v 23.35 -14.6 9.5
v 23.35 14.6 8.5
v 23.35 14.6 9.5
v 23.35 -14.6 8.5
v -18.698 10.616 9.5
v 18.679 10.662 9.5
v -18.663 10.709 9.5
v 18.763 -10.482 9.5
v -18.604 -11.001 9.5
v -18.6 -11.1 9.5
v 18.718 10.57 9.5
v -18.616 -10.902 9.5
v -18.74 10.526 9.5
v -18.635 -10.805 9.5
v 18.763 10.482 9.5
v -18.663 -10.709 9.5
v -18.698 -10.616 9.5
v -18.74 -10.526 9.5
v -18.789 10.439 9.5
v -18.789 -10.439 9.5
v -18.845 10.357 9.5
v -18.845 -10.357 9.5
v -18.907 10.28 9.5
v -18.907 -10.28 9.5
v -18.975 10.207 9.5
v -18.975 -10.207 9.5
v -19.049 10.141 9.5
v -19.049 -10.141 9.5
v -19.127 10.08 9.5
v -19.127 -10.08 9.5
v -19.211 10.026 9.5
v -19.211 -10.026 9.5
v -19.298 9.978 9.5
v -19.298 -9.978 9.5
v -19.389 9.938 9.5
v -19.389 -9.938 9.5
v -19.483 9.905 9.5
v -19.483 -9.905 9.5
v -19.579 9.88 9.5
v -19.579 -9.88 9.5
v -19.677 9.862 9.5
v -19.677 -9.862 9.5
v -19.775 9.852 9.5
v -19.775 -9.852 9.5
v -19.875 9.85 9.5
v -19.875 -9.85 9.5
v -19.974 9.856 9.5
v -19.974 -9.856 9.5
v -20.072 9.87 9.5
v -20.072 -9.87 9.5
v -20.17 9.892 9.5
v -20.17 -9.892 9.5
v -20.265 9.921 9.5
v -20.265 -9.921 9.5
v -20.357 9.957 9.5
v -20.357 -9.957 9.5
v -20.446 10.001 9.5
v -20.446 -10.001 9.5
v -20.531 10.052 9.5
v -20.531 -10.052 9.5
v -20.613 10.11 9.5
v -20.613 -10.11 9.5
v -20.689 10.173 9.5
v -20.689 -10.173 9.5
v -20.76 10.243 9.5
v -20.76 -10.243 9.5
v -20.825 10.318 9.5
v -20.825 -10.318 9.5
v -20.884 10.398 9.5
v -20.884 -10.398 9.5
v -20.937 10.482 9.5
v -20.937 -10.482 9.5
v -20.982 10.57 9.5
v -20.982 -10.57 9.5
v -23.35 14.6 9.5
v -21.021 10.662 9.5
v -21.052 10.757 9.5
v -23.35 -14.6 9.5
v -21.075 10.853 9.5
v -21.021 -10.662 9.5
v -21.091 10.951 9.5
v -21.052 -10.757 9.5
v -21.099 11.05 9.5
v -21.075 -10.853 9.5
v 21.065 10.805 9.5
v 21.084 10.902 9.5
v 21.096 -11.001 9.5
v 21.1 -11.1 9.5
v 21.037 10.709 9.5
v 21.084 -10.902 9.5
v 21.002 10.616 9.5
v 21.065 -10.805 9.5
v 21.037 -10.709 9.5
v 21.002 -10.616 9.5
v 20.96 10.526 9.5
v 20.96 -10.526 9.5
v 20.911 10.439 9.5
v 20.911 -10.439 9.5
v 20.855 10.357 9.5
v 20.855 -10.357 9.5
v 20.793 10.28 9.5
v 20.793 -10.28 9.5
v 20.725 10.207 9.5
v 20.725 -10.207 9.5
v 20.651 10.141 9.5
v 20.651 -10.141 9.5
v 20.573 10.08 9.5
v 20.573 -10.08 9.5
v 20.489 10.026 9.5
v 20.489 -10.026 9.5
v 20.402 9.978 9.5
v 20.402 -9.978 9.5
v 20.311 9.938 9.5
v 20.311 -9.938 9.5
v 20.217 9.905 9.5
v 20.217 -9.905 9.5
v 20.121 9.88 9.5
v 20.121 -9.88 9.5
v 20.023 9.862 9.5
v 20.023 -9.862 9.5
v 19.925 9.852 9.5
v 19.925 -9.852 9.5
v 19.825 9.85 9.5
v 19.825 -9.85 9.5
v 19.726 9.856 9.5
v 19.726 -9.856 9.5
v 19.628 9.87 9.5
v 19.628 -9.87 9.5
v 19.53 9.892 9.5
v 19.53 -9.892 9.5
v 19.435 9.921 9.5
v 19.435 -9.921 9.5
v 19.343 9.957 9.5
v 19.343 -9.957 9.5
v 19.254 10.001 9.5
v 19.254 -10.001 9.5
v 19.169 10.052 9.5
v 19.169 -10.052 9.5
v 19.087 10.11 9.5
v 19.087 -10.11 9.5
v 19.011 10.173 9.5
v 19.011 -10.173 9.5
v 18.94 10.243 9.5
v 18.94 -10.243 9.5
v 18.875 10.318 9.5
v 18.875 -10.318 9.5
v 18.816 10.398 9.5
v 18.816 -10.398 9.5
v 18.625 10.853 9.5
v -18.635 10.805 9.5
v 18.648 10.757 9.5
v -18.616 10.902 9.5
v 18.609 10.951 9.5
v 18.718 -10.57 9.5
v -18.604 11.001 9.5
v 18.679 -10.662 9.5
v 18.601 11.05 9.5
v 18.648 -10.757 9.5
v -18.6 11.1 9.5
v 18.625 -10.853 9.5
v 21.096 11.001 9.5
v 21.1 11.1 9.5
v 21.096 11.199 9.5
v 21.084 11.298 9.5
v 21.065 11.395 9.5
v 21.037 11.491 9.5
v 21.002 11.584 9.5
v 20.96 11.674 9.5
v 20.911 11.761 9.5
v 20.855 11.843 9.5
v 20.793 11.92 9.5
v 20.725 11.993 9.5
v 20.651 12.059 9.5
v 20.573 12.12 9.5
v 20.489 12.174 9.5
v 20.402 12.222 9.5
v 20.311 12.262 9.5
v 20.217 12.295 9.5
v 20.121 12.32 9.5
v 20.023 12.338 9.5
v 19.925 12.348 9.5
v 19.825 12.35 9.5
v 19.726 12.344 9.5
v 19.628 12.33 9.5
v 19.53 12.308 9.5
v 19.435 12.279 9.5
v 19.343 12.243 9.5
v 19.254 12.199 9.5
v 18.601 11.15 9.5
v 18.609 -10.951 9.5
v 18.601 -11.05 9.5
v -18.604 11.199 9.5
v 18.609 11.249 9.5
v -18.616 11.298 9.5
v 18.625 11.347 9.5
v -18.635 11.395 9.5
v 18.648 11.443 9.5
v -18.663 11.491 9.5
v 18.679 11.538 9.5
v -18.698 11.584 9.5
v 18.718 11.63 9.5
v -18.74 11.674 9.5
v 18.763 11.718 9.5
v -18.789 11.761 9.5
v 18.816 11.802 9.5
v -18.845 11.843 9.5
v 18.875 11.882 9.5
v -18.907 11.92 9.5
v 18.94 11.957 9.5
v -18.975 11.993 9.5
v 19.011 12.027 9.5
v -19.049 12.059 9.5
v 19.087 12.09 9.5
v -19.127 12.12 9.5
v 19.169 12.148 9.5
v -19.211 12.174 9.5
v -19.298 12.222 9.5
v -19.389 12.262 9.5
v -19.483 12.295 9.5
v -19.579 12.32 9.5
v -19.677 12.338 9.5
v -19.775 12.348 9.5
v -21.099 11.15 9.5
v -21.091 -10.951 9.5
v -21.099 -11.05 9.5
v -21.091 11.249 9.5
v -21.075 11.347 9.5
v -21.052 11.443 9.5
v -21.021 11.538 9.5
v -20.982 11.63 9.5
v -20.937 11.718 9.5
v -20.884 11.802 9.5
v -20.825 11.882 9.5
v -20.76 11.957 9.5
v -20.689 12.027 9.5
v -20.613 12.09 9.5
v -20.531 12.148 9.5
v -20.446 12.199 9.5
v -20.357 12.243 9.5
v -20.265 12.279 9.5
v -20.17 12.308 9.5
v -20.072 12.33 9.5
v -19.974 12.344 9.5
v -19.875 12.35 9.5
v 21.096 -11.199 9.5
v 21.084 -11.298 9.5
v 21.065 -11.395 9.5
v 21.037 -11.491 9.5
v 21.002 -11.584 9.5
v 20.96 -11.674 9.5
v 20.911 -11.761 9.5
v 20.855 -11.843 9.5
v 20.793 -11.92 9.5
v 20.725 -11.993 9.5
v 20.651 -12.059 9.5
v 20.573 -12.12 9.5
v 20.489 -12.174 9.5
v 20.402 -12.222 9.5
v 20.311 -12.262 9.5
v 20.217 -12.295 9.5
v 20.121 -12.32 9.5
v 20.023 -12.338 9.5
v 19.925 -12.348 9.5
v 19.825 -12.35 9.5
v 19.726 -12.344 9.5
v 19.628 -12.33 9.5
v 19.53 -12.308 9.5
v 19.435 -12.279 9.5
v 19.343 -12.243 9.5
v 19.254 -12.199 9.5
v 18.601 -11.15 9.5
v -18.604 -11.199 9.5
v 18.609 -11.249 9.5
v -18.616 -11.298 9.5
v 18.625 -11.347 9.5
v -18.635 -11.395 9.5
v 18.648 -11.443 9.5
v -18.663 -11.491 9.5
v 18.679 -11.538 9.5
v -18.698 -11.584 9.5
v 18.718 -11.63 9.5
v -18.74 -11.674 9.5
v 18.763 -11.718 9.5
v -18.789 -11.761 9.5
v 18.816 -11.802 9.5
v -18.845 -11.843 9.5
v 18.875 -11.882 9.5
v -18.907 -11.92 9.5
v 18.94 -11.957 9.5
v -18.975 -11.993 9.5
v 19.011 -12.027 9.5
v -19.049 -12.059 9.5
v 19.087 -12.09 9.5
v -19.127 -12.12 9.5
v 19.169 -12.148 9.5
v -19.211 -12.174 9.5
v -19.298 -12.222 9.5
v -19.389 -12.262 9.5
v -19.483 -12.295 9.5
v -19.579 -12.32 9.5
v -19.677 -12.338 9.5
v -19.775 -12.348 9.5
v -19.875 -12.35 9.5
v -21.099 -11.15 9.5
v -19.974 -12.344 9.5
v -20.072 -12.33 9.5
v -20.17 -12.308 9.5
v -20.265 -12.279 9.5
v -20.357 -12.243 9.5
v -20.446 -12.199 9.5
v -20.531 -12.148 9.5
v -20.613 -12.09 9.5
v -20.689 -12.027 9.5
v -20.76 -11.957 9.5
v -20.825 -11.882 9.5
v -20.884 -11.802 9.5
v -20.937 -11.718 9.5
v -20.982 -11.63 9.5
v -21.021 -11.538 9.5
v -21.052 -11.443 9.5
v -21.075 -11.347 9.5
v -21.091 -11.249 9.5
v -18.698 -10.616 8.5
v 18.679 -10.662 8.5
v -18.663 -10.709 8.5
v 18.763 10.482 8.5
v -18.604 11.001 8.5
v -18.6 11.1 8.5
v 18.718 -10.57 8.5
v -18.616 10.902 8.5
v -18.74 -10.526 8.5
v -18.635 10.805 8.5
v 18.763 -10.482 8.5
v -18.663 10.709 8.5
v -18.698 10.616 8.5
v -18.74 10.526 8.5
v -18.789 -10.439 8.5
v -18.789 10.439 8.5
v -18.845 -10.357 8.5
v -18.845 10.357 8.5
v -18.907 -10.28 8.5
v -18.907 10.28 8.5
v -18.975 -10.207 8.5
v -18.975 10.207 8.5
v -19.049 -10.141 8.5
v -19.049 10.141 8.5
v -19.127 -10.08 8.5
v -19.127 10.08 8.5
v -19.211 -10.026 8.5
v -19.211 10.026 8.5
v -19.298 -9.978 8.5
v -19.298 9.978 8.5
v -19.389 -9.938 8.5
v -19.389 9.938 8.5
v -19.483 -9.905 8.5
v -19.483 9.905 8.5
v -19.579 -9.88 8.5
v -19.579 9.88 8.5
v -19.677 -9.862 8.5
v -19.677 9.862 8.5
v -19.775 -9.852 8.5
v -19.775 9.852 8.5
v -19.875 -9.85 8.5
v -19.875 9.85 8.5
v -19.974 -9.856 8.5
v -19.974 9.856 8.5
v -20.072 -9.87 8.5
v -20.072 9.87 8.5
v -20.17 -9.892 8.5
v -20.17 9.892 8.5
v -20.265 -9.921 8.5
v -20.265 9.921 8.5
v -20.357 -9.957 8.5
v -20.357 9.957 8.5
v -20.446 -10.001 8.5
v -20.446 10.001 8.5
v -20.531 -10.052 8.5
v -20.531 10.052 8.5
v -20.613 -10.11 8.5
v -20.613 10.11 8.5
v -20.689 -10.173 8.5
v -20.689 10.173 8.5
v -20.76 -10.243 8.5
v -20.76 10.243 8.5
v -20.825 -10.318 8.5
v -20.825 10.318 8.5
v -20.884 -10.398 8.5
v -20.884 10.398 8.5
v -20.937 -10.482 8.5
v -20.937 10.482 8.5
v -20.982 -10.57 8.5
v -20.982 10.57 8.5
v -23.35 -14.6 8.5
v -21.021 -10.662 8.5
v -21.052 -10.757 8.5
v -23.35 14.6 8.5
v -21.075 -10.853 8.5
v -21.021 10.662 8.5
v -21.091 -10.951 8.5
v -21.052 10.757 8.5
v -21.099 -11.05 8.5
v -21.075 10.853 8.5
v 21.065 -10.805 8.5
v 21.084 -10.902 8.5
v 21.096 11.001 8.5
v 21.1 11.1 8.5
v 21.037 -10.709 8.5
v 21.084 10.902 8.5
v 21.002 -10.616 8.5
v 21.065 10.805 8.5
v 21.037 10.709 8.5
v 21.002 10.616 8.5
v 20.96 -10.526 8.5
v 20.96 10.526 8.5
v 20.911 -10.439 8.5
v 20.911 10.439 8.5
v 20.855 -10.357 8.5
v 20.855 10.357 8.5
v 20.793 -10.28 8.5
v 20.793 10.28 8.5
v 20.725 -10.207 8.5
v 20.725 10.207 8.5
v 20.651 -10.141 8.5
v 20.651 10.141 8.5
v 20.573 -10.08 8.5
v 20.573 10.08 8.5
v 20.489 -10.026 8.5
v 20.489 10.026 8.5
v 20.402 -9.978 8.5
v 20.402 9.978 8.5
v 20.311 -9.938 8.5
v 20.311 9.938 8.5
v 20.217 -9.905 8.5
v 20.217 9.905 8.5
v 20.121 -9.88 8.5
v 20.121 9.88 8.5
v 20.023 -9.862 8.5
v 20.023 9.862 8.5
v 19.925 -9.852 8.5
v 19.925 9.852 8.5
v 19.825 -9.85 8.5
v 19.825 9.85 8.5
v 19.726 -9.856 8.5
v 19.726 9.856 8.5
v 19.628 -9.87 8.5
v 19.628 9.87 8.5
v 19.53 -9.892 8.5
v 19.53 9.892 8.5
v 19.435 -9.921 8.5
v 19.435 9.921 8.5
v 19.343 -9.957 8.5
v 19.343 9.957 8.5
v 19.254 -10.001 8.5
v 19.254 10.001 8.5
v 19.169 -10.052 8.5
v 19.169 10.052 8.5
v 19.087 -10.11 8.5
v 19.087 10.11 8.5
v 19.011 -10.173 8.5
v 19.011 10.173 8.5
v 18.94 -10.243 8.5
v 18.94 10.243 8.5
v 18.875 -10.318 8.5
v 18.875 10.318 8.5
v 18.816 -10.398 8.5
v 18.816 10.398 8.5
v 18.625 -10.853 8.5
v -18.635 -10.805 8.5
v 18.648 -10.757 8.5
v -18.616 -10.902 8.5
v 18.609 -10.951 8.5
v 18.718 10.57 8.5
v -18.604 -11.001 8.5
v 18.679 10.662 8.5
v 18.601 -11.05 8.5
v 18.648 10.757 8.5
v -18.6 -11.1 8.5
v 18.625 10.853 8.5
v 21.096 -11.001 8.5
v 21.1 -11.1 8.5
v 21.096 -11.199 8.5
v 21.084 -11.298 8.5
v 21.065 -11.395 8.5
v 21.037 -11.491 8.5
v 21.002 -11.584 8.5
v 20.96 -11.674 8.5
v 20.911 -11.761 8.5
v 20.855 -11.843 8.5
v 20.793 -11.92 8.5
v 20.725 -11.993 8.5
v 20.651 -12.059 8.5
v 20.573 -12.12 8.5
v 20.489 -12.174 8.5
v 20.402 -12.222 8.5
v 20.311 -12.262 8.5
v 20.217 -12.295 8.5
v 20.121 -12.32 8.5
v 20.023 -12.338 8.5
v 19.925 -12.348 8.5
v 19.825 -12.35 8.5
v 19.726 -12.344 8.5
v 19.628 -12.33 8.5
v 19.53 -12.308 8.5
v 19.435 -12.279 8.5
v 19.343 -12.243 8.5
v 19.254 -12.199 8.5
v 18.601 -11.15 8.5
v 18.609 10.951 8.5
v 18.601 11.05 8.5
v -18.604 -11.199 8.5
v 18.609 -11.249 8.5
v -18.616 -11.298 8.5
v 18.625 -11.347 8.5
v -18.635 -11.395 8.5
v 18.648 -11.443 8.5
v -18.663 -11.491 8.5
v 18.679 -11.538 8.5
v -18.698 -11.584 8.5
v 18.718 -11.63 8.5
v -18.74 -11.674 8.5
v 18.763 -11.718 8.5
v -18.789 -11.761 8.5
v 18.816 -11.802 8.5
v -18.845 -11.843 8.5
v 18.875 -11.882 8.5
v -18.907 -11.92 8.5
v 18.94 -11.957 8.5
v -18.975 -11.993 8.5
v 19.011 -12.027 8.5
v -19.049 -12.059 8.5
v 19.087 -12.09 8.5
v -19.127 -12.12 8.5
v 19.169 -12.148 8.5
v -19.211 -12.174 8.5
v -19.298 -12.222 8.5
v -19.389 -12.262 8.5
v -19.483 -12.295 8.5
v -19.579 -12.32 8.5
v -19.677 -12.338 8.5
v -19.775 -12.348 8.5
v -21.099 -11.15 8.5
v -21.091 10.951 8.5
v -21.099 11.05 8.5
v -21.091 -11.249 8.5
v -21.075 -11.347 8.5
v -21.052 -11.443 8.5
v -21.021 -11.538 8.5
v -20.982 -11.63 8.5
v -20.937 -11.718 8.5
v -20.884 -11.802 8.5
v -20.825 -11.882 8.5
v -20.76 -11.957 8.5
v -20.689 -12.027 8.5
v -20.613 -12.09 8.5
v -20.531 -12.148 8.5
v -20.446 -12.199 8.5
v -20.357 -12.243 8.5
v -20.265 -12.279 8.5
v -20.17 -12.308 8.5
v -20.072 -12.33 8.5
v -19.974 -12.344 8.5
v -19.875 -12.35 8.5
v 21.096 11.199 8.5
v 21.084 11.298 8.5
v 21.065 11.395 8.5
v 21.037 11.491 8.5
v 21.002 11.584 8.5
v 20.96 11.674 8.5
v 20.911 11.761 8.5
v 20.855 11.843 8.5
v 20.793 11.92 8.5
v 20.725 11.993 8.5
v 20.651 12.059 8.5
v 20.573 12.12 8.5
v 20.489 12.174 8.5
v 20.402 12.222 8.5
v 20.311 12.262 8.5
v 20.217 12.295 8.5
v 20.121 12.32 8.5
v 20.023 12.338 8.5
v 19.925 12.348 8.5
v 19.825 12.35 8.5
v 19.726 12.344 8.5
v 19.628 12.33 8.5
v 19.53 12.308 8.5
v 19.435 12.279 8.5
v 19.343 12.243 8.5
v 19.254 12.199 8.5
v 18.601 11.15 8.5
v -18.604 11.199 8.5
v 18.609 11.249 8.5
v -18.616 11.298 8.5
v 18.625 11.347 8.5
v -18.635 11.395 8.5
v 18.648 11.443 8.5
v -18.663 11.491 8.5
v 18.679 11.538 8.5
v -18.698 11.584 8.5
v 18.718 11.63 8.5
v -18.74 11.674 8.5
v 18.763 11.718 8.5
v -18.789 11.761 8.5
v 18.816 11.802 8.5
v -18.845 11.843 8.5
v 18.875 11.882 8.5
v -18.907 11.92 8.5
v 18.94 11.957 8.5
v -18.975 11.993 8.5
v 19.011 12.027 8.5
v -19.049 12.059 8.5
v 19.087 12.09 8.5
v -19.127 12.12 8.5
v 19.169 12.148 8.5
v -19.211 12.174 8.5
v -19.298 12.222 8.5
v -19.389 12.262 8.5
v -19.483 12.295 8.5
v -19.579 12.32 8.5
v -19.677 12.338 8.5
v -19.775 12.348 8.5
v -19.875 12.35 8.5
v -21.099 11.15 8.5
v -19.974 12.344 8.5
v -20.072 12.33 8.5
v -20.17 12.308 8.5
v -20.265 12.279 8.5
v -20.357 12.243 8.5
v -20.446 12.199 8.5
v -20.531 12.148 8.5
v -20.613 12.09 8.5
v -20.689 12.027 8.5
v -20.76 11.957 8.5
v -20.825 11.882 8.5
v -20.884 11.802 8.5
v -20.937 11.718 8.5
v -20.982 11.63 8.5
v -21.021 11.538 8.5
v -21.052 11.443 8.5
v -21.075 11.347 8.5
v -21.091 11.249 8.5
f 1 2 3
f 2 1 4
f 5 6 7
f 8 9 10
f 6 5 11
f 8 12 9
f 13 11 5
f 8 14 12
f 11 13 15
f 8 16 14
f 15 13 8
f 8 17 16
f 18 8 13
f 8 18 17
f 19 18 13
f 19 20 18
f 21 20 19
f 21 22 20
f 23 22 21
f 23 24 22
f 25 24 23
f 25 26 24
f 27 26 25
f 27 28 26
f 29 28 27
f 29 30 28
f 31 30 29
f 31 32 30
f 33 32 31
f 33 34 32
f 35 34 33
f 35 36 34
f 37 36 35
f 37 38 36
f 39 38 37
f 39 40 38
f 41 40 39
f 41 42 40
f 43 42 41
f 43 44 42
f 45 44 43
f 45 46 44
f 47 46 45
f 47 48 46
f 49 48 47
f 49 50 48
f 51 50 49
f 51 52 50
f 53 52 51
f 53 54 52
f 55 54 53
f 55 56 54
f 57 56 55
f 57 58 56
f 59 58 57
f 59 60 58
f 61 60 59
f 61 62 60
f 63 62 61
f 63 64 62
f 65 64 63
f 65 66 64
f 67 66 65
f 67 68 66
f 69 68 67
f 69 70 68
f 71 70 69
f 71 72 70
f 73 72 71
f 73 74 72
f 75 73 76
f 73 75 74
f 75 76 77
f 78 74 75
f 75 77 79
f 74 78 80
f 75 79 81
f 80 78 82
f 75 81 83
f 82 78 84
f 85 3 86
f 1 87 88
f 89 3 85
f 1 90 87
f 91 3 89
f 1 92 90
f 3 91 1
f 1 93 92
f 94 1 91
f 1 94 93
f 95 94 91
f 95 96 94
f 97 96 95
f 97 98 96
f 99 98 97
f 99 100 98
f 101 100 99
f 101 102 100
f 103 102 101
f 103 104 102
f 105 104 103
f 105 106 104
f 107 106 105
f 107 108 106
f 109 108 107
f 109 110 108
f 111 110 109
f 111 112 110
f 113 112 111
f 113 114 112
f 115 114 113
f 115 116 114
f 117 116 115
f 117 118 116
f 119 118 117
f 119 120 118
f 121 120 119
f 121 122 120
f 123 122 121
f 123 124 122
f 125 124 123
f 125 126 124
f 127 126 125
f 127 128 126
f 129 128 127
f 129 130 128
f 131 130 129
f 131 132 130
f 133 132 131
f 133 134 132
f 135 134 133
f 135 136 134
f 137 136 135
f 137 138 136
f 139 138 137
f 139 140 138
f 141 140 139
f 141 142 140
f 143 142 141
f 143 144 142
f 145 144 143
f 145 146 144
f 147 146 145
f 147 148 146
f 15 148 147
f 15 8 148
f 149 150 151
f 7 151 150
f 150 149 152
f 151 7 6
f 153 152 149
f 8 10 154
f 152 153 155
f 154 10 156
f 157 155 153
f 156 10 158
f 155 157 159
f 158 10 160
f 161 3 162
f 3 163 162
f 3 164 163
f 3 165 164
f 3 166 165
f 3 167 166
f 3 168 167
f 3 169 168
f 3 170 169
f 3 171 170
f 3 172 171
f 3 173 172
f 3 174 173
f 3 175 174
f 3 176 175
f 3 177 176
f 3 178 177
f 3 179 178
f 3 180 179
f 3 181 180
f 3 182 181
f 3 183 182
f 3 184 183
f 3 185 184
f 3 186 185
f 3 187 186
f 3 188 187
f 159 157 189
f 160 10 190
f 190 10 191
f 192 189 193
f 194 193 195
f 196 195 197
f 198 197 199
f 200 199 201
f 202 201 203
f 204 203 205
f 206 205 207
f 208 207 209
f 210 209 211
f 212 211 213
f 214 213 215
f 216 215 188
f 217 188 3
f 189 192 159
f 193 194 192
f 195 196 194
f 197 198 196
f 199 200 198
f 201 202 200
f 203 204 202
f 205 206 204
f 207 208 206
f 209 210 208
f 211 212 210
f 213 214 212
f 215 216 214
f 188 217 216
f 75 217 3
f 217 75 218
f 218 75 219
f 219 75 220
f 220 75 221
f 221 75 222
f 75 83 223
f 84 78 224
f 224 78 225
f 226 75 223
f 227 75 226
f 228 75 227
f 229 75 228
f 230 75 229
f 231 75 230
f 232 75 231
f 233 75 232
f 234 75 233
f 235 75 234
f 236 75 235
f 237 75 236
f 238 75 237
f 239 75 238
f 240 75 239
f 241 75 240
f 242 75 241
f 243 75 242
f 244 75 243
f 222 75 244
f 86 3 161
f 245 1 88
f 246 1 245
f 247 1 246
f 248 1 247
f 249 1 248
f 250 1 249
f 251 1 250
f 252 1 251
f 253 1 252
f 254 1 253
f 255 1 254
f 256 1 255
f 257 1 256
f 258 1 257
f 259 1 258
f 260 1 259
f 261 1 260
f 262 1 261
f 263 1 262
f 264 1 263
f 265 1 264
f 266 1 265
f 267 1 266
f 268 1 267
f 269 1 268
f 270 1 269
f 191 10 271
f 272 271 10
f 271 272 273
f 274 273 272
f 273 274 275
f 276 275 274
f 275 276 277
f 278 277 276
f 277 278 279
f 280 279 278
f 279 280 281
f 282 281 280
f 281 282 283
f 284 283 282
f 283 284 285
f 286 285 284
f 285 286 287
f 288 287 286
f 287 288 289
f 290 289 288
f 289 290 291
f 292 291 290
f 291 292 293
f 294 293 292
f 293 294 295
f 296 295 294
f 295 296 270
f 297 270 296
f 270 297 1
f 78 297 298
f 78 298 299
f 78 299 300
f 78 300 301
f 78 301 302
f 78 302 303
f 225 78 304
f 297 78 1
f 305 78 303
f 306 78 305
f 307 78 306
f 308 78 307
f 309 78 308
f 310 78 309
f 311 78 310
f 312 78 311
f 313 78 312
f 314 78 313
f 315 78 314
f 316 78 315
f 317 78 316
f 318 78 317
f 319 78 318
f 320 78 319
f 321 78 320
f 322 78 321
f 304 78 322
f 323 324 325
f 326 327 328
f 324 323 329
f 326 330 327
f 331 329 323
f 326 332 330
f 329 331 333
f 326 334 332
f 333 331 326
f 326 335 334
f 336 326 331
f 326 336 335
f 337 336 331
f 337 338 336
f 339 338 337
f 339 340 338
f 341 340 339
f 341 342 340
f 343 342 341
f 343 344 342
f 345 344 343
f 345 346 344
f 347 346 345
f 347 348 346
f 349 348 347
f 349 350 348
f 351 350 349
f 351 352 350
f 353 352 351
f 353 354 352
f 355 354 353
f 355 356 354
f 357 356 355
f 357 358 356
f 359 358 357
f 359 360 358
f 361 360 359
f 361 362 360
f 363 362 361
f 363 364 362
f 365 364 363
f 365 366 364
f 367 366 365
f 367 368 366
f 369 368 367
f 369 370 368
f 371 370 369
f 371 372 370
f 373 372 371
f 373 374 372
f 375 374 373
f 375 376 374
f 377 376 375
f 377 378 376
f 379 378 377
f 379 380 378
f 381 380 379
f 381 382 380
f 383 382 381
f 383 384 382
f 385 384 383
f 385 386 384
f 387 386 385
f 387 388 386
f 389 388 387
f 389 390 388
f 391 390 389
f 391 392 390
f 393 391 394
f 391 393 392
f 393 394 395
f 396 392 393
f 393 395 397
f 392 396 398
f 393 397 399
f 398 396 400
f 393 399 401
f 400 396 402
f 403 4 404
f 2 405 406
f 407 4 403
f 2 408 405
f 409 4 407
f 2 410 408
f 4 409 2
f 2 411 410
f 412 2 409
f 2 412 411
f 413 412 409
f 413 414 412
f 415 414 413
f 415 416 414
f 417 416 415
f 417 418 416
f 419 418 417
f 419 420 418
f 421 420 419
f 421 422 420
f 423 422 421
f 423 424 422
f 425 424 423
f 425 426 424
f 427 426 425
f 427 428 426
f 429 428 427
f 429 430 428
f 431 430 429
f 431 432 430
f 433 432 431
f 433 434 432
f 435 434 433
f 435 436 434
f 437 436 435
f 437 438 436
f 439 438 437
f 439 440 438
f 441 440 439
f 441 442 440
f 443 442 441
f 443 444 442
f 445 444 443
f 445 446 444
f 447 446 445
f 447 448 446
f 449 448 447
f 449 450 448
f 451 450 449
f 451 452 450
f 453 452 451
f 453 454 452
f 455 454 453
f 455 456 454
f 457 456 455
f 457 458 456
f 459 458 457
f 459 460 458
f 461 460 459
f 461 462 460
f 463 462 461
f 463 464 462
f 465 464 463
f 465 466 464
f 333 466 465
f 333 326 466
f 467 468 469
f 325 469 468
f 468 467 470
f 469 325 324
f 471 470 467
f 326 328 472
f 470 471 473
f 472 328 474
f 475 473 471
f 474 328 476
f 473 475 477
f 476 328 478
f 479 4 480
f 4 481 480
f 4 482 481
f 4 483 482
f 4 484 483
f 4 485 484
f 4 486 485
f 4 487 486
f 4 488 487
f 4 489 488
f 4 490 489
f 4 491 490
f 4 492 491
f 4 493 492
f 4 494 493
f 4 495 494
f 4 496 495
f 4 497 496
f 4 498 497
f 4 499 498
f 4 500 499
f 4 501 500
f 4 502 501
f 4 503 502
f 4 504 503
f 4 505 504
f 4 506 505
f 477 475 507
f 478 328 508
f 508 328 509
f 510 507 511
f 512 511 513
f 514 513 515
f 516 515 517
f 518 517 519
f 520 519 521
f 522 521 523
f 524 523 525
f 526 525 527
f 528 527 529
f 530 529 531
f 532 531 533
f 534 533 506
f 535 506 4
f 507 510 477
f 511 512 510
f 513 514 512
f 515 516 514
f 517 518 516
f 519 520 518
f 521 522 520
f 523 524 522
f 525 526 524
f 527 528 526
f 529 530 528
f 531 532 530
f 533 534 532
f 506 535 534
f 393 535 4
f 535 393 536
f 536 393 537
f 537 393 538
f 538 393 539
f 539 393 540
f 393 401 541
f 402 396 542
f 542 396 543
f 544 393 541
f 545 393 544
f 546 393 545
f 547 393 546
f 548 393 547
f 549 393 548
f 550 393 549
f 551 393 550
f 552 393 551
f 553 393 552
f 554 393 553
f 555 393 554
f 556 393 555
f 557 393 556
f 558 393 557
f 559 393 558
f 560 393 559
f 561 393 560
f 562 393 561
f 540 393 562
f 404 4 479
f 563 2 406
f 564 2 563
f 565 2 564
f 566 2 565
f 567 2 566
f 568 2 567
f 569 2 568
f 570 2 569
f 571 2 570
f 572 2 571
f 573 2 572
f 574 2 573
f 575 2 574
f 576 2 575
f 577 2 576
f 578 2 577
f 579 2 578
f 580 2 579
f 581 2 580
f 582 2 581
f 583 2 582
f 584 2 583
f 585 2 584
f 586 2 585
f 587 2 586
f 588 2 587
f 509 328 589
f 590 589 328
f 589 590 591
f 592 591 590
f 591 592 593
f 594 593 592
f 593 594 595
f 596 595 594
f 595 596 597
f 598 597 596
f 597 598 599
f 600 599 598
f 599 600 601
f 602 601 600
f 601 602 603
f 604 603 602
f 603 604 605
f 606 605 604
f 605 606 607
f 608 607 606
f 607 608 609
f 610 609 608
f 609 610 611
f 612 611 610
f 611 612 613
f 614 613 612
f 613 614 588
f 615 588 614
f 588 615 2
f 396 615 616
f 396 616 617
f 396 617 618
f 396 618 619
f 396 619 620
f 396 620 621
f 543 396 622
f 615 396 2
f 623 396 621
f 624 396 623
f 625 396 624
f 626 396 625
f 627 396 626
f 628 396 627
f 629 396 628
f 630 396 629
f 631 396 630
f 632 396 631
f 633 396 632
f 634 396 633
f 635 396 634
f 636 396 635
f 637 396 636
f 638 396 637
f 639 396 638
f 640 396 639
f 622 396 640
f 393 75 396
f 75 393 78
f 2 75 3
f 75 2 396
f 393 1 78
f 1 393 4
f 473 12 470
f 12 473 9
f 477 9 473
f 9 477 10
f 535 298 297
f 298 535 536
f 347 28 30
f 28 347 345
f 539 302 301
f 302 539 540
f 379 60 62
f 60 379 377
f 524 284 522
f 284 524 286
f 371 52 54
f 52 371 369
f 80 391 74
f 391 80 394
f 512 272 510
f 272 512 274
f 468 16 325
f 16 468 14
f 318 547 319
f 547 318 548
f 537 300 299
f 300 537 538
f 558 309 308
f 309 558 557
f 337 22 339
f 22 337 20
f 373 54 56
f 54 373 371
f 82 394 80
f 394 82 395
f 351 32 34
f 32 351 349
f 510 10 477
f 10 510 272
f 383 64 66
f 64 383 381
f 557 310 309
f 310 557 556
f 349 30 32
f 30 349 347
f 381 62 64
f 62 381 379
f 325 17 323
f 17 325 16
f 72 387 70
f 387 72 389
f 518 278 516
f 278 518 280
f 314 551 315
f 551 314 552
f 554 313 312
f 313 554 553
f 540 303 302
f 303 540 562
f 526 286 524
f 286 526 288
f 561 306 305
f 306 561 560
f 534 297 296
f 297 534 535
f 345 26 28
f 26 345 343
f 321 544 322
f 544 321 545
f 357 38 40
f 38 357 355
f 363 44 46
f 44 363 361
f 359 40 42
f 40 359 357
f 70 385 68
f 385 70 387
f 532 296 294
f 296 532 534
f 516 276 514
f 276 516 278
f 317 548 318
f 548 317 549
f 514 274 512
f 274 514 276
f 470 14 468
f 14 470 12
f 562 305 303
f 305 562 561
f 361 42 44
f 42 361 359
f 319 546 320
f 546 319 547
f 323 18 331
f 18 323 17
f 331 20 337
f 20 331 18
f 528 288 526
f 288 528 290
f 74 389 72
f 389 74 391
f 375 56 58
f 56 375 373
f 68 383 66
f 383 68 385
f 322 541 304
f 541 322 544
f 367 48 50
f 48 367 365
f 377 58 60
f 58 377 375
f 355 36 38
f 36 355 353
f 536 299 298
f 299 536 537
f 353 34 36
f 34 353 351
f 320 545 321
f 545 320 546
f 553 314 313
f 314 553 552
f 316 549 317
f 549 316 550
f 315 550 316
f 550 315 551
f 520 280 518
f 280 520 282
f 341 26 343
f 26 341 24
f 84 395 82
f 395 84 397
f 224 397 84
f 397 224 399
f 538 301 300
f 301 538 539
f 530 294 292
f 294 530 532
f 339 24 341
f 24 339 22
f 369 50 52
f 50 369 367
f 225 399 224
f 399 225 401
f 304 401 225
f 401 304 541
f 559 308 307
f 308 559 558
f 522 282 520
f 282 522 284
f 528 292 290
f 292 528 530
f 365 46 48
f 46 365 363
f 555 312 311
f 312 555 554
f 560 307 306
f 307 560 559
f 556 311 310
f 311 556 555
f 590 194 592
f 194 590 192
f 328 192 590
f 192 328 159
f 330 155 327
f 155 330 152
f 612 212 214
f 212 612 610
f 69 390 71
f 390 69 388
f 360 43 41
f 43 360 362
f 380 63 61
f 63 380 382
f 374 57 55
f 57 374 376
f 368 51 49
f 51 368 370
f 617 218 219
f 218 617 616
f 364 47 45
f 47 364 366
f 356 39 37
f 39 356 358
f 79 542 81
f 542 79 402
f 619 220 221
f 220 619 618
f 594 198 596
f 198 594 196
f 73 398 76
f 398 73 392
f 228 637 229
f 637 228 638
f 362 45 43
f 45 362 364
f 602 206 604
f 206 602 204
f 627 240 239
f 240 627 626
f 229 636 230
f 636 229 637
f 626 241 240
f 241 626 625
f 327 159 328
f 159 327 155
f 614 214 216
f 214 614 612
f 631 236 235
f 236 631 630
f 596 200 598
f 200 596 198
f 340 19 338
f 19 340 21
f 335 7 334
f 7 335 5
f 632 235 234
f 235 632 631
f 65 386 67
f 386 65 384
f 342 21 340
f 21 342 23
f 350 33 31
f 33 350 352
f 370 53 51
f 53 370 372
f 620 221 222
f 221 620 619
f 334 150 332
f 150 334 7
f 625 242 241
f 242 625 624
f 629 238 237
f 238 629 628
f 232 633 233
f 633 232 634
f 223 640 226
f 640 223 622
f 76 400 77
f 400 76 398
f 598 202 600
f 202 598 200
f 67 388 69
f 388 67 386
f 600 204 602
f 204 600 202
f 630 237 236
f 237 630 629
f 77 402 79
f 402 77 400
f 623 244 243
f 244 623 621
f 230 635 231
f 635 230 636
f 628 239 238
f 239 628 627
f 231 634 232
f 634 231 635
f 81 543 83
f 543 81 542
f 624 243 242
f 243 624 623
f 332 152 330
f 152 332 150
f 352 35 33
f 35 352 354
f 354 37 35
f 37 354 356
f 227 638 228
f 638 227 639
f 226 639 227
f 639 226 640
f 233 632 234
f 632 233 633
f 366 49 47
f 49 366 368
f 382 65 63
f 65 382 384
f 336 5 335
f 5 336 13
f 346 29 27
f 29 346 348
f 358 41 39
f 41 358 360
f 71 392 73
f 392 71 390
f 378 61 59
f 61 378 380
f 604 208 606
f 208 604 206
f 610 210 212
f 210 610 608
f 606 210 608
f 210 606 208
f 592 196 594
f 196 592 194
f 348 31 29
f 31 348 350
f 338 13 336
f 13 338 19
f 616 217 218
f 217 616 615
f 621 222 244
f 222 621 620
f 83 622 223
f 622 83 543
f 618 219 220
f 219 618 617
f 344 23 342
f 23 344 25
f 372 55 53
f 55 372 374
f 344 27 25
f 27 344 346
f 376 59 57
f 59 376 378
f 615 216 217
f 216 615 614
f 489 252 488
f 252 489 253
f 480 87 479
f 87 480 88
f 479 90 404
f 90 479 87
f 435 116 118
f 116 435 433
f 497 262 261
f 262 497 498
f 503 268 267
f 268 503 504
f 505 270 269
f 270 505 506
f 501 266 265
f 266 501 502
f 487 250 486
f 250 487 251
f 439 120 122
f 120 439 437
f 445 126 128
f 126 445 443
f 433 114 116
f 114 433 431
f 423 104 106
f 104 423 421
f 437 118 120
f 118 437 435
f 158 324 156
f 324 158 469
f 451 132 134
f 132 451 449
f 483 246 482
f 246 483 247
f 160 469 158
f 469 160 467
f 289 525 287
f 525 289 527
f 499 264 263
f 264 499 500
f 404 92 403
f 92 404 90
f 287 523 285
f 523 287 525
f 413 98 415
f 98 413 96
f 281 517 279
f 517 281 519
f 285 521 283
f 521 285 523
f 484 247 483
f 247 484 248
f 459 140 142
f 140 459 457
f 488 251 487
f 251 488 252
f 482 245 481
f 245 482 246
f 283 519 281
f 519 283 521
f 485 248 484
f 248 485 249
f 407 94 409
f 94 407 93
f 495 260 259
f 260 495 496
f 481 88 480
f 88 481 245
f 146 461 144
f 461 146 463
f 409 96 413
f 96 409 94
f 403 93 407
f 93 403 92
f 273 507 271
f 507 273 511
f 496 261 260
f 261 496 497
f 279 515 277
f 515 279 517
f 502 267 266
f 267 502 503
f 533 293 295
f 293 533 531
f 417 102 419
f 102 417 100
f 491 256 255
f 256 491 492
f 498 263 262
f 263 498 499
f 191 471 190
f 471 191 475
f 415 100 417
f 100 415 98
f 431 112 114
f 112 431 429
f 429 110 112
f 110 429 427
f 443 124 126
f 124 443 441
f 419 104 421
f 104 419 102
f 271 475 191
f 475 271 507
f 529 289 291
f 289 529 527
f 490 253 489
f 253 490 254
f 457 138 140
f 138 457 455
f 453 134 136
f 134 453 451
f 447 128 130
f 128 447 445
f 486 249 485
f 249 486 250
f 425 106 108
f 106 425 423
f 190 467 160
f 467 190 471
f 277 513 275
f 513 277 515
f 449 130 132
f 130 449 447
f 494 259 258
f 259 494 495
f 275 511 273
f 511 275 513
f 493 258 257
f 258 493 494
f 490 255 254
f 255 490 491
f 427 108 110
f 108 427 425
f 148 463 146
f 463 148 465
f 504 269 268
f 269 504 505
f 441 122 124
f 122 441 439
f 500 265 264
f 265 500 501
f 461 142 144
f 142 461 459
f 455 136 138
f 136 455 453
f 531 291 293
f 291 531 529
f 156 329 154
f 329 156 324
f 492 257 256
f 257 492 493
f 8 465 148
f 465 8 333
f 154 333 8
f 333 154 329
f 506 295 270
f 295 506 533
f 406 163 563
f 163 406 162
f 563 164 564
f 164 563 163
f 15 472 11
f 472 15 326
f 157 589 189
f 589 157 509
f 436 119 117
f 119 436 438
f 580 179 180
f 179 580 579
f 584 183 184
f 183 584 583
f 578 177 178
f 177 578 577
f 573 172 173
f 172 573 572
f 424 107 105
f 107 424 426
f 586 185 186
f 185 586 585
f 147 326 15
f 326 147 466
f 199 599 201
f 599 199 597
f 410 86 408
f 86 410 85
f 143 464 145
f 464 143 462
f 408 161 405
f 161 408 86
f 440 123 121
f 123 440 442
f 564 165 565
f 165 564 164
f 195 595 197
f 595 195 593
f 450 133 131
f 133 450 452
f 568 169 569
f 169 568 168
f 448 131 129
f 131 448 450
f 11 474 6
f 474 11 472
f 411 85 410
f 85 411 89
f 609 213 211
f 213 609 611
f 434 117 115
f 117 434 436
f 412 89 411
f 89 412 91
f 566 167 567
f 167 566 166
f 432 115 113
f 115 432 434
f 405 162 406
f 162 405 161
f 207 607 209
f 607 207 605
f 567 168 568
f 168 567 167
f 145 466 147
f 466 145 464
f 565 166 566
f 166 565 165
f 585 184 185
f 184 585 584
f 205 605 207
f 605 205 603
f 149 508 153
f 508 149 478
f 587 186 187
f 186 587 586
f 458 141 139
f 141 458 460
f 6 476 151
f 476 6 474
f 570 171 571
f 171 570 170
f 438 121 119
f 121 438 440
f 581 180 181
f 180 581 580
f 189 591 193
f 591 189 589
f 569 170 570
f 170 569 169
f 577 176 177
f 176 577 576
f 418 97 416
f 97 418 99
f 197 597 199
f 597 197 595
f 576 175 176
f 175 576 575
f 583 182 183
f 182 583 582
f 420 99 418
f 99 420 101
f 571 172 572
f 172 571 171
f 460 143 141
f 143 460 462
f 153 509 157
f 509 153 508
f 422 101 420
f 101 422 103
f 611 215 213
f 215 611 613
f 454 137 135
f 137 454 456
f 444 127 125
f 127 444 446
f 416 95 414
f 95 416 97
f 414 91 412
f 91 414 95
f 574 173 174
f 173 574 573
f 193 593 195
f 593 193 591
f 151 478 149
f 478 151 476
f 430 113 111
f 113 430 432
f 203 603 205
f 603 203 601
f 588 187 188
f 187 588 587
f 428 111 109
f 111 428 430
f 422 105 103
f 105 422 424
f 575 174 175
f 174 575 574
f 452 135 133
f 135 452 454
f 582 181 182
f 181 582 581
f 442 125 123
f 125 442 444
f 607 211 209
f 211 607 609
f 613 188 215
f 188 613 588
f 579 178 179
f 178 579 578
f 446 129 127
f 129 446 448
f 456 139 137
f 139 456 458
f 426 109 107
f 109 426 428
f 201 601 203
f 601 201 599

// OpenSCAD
$fs=0.1; $fa=0.1;
color([1, 0, 0]){
    translate(v=[0, 0, 8.999999999999998]){
        difference(){
            cube(size=[46.7, 29.2, 1], center=true);
            translate(v=[-19.85, -11.1]){
                cylinder(h=1.1, d=2.5, center=true);
            };
            translate(v=[-19.85, 11.1]){
                cylinder(h=1.1, d=2.5, center=true);
            };
            translate(v=[19.85, -11.1]){
                cylinder(h=1.1, d=2.5, center=true);
            };
            translate(v=[19.85, 11.1]){
                cylinder(h=1.1, d=2.5, center=true);
            };
        };
    };
};
